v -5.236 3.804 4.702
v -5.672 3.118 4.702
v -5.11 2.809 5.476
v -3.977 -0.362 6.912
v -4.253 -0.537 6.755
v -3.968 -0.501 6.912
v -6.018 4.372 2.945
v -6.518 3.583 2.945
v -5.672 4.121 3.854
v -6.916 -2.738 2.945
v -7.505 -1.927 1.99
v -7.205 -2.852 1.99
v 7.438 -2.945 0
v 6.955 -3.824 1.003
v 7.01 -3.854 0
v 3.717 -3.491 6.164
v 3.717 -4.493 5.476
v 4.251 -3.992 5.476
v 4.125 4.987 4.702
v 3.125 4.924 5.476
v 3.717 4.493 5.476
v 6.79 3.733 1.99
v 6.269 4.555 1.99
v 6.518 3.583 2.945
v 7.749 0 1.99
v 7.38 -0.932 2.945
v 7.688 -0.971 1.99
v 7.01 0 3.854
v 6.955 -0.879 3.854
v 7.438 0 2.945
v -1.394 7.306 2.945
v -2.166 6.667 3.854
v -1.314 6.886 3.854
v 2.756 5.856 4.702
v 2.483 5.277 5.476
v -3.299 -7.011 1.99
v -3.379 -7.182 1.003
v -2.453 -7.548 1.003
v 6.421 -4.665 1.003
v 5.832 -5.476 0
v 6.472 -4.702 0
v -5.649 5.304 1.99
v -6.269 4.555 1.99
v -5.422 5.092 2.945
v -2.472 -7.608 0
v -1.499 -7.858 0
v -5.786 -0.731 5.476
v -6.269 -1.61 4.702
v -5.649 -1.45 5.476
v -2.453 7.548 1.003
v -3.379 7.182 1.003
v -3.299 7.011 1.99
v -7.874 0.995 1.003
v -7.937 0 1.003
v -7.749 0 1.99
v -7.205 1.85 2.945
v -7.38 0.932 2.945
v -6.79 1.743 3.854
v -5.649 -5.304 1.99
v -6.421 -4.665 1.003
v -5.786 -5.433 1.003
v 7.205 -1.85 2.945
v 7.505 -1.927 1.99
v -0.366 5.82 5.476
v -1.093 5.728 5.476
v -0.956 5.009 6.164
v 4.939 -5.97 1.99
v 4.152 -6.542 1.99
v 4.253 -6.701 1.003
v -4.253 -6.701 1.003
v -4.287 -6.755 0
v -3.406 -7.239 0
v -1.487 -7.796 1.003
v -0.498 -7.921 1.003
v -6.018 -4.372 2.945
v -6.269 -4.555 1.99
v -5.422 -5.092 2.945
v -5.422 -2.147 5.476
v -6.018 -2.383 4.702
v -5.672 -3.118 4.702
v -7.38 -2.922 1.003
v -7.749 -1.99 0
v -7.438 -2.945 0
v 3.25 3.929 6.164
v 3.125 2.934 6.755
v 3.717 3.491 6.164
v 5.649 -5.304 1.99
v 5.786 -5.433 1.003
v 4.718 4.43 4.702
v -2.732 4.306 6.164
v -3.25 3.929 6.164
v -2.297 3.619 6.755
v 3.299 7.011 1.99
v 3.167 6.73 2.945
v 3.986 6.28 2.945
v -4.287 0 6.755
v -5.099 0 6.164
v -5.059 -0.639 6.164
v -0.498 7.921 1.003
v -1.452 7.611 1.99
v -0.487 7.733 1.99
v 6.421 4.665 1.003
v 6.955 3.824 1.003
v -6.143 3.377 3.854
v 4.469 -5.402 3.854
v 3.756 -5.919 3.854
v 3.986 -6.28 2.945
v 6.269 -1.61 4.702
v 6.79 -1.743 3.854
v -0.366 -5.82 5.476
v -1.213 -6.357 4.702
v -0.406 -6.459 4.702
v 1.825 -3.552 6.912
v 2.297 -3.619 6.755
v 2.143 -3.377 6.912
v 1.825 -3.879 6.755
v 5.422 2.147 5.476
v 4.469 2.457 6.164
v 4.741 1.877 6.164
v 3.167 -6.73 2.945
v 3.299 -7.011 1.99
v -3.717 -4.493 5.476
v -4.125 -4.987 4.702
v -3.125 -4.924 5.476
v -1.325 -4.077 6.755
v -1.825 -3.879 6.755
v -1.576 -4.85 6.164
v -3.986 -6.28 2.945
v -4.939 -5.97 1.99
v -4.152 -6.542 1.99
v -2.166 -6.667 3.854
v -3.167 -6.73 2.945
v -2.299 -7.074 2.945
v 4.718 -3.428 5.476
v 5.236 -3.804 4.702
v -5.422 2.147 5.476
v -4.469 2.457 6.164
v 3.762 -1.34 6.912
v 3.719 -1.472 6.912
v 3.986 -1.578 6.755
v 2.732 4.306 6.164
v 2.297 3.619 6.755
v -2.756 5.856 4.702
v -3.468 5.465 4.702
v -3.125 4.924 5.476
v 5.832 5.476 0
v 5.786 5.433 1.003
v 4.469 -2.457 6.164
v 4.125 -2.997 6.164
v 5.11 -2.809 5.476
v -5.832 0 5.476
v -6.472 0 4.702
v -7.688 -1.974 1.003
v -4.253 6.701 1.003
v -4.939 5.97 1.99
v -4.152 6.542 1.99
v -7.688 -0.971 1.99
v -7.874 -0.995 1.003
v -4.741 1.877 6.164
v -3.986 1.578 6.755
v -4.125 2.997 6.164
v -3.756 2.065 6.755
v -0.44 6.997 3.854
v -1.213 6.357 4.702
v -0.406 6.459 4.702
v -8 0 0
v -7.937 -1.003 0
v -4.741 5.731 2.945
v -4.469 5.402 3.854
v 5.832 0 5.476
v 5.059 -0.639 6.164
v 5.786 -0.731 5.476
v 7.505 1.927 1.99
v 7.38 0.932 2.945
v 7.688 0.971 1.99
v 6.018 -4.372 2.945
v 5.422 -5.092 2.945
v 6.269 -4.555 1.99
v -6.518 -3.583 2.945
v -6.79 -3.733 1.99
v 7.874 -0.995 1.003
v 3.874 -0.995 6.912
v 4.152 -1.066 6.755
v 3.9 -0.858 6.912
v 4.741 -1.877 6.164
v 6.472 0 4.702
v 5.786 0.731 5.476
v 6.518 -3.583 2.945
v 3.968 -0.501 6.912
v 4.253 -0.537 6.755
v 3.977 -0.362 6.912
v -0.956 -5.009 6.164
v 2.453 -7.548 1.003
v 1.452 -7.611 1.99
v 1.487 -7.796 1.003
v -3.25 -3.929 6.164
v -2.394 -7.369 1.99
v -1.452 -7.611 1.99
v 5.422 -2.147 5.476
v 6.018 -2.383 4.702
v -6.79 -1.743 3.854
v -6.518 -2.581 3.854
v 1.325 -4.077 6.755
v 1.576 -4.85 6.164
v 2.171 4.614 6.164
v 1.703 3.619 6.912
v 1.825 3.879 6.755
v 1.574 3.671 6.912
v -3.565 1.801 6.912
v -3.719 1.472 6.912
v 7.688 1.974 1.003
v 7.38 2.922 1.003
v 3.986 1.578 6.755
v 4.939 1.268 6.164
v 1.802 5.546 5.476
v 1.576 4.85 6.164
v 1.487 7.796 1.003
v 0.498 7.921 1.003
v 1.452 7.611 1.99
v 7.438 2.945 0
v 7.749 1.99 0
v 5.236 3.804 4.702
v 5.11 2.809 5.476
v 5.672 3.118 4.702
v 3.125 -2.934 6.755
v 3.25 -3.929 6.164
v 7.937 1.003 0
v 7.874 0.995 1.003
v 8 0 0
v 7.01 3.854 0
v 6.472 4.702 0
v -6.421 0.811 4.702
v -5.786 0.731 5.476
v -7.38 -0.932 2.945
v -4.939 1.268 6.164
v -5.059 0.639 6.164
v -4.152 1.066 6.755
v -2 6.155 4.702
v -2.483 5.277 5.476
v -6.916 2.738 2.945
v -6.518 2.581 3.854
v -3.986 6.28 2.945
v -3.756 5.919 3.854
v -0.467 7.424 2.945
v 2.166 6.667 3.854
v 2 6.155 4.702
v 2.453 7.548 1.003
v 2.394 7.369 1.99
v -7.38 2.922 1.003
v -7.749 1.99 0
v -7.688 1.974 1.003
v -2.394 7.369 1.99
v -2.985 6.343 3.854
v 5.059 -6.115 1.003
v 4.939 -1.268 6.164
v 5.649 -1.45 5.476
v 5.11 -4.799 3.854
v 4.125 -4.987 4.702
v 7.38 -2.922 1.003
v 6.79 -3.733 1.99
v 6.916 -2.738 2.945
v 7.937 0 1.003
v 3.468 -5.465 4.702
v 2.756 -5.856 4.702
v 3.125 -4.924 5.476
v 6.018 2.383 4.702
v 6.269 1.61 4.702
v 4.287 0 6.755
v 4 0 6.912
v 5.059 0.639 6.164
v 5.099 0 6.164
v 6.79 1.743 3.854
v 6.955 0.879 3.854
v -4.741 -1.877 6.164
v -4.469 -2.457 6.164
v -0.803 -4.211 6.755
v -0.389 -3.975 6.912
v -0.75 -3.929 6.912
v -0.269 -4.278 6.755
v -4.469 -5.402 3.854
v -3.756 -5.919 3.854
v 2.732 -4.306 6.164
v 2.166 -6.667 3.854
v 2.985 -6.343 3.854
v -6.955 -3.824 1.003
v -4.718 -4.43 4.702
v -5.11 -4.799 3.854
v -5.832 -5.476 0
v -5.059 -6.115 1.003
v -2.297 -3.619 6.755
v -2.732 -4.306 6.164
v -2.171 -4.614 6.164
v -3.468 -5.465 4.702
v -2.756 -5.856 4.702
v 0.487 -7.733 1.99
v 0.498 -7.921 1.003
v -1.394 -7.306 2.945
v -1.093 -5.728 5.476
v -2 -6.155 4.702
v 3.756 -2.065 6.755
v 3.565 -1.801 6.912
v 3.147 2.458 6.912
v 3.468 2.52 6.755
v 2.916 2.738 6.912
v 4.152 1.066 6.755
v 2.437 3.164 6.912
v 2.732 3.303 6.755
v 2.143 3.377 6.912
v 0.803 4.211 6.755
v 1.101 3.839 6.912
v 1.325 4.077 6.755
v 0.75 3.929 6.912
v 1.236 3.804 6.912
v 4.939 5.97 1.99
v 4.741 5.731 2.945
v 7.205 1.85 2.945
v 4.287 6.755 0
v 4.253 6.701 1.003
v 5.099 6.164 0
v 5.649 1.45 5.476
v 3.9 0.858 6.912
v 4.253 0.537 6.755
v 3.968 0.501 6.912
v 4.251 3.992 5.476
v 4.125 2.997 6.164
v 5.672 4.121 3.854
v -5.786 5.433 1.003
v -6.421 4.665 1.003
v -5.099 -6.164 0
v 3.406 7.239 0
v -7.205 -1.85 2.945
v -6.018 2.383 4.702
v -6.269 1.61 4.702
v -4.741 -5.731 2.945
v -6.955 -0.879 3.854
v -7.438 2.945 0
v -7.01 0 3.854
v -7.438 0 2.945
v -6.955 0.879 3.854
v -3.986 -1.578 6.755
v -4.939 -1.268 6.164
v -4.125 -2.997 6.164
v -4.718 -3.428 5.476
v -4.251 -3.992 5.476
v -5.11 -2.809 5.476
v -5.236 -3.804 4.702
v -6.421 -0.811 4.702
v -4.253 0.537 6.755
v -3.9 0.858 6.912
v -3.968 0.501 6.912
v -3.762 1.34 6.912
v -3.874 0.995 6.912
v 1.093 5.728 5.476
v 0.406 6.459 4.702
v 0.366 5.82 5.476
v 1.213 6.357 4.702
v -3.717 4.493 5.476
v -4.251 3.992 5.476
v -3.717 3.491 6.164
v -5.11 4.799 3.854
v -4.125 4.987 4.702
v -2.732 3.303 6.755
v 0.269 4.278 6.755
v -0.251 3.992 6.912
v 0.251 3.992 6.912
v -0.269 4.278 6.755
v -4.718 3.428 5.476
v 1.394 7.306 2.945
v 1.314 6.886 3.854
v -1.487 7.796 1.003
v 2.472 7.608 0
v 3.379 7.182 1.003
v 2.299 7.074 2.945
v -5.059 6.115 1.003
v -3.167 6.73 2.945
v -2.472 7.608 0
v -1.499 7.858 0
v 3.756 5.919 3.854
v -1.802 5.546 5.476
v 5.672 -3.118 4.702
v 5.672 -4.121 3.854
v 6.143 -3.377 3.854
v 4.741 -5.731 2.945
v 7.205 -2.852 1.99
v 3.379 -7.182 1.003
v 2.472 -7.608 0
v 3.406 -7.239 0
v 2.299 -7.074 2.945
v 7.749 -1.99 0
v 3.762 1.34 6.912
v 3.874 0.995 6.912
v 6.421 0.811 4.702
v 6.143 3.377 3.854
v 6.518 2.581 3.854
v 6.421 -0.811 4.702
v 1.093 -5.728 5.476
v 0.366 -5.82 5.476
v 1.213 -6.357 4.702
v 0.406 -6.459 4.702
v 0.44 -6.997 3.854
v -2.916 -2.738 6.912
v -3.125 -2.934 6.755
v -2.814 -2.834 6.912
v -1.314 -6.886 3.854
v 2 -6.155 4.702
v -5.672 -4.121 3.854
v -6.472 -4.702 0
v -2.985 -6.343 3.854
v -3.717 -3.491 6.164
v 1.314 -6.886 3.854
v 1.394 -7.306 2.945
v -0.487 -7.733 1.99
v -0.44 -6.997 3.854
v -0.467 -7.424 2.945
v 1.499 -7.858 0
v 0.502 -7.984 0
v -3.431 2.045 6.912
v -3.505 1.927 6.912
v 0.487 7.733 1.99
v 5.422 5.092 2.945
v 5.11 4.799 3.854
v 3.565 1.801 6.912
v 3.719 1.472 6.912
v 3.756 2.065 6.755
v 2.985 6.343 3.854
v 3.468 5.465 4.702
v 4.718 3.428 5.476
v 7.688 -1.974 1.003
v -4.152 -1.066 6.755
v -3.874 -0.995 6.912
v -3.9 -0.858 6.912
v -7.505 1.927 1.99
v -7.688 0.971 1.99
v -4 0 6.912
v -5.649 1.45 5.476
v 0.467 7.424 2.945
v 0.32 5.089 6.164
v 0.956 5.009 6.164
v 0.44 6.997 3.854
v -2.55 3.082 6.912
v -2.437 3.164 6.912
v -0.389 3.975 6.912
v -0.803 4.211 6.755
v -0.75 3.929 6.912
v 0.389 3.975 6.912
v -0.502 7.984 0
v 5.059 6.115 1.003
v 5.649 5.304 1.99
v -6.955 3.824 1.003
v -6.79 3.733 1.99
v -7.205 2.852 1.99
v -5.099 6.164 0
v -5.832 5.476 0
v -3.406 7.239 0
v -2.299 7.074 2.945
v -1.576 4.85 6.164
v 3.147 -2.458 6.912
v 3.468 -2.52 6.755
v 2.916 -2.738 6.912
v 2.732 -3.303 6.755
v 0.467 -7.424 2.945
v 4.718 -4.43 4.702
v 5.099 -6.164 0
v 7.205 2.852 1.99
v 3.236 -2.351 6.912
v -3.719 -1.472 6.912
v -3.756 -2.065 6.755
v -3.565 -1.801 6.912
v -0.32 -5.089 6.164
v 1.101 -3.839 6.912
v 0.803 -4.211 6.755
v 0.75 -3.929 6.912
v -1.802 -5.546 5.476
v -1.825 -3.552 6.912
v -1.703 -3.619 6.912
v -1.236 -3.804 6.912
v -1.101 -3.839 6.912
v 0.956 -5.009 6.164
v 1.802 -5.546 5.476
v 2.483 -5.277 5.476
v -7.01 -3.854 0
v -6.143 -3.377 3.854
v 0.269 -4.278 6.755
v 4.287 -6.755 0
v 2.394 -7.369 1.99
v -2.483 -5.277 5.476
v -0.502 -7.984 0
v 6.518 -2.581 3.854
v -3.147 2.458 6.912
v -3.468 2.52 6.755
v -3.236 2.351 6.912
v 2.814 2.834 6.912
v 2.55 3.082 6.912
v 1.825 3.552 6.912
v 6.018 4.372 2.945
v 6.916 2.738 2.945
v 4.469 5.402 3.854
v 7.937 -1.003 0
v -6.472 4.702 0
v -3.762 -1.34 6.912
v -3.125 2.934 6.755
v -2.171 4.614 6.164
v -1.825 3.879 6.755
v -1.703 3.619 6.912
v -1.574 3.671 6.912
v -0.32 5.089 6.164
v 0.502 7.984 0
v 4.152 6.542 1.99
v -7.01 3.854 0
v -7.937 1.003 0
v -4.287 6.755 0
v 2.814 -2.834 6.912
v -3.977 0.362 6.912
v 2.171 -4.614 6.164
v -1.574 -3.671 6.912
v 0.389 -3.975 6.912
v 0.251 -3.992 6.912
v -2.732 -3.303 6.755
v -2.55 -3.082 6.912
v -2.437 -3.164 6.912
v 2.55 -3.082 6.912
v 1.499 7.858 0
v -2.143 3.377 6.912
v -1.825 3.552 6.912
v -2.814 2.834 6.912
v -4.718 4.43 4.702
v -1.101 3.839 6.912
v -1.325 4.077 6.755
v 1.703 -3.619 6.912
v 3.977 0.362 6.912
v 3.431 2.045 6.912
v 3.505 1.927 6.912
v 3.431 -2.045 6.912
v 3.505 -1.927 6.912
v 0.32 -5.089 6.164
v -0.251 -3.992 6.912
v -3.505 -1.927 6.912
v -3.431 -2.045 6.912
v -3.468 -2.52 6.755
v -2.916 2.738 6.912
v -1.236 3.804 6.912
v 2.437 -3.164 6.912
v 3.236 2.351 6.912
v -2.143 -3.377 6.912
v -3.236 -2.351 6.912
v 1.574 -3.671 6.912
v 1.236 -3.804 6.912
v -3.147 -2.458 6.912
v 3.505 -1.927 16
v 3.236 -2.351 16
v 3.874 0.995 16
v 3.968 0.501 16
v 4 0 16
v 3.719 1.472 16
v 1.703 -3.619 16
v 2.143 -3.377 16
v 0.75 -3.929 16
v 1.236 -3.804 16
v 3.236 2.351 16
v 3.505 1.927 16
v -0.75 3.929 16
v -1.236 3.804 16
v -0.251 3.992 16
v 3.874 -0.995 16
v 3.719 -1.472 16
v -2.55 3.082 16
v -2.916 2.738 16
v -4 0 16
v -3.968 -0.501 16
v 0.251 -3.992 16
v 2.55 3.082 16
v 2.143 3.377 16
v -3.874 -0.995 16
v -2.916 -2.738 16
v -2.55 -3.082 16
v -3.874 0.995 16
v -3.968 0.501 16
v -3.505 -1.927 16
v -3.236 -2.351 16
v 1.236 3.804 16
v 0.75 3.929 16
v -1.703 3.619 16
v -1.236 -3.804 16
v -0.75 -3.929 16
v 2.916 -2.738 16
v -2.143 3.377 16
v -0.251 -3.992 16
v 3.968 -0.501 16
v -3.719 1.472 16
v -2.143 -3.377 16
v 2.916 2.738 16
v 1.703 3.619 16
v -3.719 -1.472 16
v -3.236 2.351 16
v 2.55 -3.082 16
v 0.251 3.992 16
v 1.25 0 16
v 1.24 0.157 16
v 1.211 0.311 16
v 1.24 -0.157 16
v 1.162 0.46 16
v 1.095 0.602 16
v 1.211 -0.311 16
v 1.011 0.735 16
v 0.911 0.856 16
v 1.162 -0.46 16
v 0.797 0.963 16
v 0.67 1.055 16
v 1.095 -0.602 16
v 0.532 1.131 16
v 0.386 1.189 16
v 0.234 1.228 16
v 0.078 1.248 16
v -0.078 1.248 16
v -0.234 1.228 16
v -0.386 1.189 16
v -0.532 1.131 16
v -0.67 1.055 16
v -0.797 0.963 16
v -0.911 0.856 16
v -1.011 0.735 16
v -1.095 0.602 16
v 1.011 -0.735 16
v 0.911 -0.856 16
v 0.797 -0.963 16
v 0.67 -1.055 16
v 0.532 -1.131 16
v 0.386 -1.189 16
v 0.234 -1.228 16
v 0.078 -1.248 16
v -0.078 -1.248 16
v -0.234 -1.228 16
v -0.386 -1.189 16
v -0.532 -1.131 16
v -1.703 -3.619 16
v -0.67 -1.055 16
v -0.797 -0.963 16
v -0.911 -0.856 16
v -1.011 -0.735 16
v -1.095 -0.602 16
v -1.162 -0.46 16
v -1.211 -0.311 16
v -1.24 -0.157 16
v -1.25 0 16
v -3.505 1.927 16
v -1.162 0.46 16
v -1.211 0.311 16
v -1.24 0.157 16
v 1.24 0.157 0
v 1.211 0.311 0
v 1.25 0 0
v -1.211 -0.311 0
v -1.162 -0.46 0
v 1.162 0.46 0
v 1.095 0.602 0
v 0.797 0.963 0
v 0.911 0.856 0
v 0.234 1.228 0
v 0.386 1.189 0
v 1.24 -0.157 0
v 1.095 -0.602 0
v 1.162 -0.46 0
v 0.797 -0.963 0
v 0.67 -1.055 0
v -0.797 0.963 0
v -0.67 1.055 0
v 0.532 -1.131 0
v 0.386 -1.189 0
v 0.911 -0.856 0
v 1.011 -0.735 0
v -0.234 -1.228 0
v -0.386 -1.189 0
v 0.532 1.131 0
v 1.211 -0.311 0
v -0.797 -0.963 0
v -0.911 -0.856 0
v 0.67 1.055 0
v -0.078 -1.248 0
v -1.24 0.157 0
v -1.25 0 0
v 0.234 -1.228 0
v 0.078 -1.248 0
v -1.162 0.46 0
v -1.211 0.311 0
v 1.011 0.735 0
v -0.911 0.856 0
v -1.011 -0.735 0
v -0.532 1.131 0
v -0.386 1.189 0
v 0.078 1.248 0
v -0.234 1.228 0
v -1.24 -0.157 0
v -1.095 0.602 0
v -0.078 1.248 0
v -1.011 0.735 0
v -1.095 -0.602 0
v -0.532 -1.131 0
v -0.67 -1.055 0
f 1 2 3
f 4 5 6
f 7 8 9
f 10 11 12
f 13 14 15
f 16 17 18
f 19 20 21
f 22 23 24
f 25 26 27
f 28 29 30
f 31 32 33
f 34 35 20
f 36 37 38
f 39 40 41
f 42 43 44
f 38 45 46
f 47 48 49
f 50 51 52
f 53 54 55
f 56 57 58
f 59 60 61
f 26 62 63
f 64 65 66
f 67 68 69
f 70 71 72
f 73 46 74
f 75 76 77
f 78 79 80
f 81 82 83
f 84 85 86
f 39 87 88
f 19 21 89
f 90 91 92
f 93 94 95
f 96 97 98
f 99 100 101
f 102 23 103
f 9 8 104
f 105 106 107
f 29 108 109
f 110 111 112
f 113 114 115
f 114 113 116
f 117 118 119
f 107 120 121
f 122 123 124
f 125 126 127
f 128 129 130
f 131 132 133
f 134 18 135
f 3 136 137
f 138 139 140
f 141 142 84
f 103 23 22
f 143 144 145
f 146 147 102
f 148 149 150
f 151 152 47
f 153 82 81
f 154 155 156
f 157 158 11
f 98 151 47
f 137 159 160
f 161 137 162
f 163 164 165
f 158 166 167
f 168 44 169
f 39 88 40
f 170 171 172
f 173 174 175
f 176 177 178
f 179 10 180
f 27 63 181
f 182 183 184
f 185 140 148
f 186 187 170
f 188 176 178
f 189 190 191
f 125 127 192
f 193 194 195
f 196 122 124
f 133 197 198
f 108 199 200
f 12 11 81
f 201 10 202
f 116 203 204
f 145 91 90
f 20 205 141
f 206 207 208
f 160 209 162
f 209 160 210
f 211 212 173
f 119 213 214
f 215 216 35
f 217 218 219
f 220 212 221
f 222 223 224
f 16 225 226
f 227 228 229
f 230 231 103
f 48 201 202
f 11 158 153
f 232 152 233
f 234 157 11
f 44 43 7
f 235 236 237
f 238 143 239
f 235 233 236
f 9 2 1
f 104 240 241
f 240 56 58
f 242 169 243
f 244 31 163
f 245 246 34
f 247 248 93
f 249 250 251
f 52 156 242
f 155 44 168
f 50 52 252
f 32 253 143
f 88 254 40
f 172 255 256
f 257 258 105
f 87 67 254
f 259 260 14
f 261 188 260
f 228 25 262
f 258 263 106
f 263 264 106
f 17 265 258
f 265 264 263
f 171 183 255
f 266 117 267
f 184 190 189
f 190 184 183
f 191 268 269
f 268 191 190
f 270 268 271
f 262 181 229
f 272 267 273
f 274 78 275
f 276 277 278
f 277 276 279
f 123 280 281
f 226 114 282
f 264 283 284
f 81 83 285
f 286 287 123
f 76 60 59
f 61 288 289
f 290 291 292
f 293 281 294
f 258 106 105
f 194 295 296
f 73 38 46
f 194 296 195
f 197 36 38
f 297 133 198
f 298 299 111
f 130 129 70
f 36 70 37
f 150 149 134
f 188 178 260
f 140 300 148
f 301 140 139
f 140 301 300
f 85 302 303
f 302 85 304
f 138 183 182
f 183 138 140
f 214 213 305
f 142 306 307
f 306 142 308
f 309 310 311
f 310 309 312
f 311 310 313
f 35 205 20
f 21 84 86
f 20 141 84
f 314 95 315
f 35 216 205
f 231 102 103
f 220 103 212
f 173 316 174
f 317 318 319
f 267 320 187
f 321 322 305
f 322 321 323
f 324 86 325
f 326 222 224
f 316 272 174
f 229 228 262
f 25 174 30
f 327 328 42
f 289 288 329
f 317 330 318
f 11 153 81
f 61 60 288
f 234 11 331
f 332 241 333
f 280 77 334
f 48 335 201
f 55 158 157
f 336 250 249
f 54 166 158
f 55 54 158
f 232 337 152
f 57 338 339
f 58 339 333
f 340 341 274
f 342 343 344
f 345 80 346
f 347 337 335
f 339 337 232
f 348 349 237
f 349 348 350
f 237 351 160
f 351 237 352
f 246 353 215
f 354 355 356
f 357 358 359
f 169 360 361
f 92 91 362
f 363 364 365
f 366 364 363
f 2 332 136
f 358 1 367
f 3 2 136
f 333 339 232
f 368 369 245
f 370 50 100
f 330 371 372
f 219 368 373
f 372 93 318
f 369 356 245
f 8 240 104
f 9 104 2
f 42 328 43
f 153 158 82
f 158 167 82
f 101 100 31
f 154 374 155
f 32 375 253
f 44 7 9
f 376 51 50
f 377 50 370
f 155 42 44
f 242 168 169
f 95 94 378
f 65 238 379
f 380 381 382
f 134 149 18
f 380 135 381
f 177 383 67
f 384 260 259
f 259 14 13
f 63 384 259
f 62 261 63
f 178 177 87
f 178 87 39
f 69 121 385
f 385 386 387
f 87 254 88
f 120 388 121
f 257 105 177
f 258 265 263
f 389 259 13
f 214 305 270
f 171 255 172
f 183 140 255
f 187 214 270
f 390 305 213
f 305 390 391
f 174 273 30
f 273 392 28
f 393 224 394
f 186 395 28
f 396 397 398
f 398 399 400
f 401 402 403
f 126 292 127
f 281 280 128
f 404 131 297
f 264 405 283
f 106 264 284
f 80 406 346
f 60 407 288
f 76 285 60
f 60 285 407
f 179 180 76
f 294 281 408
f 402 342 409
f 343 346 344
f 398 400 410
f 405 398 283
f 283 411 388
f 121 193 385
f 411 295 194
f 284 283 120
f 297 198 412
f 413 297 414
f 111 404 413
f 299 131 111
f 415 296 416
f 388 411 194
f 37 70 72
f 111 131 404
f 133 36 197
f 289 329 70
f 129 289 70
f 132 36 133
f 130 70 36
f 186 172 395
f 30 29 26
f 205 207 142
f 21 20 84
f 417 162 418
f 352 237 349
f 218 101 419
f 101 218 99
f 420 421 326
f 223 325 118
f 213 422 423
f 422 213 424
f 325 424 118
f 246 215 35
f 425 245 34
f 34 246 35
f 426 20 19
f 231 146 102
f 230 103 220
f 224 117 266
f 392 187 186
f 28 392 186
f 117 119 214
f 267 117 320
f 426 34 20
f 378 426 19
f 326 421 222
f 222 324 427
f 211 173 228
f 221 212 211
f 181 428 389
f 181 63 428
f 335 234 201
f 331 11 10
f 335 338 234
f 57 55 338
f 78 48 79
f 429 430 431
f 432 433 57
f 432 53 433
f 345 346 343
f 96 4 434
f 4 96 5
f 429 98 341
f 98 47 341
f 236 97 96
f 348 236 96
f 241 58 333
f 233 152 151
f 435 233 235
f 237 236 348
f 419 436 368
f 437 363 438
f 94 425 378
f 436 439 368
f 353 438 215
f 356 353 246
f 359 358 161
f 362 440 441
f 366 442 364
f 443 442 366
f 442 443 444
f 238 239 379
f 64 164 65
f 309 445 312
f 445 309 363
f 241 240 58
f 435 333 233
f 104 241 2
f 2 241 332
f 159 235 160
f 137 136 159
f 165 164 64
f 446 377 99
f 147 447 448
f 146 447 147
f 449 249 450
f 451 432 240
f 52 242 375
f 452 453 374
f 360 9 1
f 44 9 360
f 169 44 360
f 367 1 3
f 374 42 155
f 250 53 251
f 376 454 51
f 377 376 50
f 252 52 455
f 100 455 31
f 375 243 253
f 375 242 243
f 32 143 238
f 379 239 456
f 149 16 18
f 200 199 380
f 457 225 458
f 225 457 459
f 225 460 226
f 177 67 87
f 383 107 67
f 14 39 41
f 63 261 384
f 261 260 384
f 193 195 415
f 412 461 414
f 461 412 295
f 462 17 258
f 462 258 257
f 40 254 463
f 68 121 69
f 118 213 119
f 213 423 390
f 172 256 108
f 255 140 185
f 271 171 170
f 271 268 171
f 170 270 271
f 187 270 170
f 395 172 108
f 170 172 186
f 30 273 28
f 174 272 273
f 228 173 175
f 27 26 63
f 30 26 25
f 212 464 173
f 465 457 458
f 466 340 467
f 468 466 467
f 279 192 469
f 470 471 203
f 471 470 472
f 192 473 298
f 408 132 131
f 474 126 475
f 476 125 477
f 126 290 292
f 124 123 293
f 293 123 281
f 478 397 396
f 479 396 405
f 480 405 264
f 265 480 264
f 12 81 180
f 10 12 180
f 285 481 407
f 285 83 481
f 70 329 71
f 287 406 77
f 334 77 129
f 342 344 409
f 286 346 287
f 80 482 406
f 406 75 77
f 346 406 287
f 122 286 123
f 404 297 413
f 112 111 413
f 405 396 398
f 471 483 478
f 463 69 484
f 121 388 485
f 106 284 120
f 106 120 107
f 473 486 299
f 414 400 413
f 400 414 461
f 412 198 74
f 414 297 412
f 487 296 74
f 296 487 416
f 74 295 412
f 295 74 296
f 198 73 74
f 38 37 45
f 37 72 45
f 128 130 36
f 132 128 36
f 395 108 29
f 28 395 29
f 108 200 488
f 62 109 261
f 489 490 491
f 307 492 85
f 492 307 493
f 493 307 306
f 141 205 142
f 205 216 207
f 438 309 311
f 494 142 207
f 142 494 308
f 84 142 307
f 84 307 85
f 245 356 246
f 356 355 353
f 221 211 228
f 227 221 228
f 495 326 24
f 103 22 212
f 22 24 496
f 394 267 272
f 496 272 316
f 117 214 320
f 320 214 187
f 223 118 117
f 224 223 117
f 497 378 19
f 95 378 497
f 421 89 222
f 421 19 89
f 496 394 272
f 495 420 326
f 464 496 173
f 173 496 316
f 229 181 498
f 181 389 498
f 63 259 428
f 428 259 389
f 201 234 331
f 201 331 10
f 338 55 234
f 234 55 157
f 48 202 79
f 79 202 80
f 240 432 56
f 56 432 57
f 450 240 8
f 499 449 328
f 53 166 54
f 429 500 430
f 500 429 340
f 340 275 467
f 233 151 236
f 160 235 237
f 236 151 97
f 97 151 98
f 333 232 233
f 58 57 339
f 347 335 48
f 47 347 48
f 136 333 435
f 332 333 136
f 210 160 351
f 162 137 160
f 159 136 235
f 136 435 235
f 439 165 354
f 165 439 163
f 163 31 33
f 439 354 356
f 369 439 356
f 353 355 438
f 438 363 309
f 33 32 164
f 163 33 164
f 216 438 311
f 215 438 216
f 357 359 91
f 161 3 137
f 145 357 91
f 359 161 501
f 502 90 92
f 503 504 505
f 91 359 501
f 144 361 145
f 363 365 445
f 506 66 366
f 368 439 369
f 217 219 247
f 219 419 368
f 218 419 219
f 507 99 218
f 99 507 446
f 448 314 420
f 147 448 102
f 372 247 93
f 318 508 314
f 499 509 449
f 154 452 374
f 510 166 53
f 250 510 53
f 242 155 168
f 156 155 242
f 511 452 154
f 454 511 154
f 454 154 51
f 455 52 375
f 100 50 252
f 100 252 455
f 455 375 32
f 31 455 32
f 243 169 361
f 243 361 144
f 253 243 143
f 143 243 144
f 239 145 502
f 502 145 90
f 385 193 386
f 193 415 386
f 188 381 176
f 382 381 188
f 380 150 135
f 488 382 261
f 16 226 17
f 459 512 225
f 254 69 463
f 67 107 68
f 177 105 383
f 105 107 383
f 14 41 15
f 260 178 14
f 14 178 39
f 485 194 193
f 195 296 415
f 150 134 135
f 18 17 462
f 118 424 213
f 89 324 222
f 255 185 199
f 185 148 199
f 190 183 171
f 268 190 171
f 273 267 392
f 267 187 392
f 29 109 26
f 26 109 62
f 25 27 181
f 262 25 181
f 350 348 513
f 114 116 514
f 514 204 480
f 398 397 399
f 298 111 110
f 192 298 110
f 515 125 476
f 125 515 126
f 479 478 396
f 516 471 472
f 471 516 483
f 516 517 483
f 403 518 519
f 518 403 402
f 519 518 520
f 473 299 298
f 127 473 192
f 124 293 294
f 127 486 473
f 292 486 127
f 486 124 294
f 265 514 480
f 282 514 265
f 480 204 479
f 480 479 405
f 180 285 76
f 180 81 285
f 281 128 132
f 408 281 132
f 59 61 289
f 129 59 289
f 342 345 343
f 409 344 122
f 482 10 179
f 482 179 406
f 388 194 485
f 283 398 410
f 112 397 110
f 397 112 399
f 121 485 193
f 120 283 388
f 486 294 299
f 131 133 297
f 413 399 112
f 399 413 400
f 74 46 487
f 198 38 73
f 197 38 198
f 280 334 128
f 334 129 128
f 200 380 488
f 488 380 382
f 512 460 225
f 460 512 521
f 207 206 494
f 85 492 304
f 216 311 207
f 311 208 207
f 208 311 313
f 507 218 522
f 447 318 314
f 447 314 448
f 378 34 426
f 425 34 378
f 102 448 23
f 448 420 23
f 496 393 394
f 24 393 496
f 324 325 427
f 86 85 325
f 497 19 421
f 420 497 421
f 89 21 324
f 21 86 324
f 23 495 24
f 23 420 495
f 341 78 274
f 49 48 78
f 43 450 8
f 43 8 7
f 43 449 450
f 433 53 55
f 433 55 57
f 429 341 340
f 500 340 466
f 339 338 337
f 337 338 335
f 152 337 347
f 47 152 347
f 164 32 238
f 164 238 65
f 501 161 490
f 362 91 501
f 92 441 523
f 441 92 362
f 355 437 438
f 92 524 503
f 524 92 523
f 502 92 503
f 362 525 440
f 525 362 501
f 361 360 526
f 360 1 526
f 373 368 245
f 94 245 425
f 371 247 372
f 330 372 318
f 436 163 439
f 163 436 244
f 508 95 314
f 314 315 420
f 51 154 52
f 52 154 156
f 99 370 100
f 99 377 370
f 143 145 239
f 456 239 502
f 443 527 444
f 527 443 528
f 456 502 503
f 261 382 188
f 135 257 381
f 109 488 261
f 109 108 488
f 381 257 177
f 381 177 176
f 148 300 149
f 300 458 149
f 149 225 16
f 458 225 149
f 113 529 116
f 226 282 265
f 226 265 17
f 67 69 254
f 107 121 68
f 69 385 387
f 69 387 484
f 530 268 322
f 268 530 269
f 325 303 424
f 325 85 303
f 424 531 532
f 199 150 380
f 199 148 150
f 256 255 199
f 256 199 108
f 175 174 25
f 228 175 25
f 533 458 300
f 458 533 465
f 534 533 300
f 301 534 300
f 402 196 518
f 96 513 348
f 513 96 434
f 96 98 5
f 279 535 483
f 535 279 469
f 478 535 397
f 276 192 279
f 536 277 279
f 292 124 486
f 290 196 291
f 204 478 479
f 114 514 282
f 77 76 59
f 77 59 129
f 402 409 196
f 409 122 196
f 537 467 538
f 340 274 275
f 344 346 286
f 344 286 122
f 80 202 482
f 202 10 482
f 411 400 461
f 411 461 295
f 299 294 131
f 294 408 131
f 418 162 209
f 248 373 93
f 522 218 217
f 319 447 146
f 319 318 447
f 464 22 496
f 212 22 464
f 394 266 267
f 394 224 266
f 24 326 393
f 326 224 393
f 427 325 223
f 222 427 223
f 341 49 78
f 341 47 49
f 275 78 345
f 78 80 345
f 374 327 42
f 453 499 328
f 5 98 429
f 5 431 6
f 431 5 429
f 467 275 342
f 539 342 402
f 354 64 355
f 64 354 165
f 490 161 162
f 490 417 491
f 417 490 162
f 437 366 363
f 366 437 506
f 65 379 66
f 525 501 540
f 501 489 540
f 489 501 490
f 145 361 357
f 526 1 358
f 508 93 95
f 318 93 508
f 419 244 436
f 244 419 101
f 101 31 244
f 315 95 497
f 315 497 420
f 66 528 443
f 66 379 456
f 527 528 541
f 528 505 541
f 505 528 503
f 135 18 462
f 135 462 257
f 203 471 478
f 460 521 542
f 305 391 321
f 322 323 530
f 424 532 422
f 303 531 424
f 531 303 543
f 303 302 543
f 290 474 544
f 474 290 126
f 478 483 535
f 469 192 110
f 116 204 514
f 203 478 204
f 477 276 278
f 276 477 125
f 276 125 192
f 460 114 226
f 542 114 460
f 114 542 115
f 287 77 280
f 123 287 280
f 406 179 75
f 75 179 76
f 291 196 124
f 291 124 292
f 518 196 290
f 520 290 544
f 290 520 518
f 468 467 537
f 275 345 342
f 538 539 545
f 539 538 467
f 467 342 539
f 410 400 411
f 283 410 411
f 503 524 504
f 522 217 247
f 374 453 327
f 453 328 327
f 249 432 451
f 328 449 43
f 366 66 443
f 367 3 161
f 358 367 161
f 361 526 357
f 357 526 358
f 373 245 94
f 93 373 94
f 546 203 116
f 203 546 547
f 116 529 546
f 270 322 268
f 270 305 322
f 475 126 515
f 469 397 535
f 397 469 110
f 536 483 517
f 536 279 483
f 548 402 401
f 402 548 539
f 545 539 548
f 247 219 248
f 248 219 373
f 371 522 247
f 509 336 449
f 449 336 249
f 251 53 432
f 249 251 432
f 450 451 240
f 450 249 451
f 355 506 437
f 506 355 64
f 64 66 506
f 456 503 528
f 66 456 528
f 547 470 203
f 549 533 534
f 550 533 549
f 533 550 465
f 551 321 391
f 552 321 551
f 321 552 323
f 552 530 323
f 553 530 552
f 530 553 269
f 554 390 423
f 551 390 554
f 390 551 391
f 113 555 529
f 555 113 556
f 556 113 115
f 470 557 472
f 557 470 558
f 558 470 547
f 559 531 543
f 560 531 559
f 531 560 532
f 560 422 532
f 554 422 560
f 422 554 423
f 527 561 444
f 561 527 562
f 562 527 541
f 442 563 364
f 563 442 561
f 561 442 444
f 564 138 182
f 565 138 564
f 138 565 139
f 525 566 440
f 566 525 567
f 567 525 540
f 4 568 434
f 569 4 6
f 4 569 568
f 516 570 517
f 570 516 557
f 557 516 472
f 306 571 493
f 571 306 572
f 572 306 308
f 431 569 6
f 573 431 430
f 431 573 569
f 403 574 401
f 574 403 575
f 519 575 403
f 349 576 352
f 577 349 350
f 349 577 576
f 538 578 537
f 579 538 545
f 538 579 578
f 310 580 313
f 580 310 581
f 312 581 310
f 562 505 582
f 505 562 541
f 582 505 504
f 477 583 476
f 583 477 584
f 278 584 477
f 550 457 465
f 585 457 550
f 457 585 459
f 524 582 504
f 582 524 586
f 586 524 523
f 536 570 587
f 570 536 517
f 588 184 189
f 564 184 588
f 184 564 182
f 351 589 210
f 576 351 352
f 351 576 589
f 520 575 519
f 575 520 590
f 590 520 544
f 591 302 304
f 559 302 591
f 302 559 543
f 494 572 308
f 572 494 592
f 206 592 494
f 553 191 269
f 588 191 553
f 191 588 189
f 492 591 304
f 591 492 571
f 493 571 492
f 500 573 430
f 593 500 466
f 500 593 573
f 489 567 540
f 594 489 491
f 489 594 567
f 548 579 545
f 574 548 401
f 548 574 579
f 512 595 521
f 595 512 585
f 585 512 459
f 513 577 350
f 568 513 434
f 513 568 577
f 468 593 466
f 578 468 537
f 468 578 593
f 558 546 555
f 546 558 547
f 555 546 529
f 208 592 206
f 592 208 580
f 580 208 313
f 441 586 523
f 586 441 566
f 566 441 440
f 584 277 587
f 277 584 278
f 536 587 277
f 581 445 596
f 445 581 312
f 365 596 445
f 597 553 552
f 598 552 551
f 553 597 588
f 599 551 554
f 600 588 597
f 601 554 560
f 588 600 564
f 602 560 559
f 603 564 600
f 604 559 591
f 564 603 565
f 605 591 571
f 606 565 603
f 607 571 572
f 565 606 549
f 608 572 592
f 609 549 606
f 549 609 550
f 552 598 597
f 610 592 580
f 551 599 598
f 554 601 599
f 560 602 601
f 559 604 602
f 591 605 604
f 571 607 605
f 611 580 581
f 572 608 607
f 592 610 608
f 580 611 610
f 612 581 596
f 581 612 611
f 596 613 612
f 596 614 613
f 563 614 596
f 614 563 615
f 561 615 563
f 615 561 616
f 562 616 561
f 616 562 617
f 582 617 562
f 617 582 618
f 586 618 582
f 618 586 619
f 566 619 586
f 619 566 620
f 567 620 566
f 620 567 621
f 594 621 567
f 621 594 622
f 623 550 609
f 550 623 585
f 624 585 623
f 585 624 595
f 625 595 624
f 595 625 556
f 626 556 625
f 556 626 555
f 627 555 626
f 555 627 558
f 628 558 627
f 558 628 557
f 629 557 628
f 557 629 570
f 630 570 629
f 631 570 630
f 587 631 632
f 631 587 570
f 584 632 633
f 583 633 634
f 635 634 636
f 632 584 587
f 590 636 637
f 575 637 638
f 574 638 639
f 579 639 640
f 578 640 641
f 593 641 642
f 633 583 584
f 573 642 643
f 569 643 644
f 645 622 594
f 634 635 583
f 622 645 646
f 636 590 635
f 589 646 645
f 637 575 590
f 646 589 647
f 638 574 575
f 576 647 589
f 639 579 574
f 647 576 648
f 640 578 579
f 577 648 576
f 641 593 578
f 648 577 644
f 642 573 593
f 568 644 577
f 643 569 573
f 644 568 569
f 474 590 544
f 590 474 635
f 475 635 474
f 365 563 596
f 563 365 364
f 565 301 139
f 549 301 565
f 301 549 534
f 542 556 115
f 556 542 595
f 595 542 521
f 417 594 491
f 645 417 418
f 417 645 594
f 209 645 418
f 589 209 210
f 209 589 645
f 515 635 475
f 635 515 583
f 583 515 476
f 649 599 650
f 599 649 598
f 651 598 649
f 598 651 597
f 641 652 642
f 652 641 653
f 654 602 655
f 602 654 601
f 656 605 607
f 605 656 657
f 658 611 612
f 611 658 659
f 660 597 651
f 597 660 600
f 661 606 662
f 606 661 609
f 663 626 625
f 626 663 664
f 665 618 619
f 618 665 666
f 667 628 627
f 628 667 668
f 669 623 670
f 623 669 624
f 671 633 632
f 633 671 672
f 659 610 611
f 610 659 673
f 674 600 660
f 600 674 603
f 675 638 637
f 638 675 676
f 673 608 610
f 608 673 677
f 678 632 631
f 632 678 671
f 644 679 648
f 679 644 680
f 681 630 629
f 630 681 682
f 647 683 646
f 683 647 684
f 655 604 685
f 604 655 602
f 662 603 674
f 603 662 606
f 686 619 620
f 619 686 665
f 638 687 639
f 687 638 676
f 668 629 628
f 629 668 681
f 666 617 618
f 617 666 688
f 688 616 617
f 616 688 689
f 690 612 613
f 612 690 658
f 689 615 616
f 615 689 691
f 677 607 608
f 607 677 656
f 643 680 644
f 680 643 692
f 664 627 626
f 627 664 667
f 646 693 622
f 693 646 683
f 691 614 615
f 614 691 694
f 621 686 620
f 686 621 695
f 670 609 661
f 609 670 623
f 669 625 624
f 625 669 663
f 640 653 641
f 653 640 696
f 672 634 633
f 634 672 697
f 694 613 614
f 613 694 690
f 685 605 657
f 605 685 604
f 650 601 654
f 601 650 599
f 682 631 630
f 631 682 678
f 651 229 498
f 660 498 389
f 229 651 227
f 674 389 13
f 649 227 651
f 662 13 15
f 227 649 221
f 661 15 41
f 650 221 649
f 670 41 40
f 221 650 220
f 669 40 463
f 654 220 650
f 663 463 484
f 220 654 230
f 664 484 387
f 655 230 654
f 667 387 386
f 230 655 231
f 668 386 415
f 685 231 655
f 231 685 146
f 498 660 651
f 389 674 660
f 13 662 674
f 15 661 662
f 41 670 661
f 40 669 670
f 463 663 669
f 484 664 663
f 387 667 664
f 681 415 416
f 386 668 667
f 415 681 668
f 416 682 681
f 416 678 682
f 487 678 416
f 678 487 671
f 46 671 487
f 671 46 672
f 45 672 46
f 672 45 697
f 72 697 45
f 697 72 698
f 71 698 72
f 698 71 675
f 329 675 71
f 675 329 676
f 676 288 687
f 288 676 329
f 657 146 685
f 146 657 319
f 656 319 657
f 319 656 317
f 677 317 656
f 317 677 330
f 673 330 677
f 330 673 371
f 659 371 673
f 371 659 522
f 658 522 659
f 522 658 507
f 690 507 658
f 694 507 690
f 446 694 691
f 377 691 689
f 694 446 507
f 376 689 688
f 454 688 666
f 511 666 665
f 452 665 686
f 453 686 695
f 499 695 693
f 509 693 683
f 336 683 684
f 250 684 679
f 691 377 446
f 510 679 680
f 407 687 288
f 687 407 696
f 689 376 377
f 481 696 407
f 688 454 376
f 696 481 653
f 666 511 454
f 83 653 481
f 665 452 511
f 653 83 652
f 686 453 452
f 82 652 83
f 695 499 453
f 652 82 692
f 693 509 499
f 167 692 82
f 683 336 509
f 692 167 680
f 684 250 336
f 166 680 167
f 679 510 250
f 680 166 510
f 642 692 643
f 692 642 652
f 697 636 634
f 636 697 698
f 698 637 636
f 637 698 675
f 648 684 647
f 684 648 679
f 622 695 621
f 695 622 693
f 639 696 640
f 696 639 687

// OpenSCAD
// sphere mount


sphere_dia = 16;


$fn = 50;
screw_major = 8;
screw_dia = 2.5;      // use much small for sake of printing
screw_segment = 8;

difference () {
    union () {
        sphere(r = sphere_dia/2);
        translate([0,0, sphere_dia/2])
        cylinder(r = screw_major/2, h = sphere_dia/2 + screw_segment, center = true);
    }
    // center hole
    union() {
        translate([0,0, sphere_dia/2])
        cylinder(r = screw_dia/2, h = sphere_dia/2 + screw_segment, center = true);
        
        // take out 1/2 of the sphere
        translate([0,0,-sphere_dia/4])
        cube([sphere_dia, sphere_dia, sphere_dia/2], center = true);
    }
}
